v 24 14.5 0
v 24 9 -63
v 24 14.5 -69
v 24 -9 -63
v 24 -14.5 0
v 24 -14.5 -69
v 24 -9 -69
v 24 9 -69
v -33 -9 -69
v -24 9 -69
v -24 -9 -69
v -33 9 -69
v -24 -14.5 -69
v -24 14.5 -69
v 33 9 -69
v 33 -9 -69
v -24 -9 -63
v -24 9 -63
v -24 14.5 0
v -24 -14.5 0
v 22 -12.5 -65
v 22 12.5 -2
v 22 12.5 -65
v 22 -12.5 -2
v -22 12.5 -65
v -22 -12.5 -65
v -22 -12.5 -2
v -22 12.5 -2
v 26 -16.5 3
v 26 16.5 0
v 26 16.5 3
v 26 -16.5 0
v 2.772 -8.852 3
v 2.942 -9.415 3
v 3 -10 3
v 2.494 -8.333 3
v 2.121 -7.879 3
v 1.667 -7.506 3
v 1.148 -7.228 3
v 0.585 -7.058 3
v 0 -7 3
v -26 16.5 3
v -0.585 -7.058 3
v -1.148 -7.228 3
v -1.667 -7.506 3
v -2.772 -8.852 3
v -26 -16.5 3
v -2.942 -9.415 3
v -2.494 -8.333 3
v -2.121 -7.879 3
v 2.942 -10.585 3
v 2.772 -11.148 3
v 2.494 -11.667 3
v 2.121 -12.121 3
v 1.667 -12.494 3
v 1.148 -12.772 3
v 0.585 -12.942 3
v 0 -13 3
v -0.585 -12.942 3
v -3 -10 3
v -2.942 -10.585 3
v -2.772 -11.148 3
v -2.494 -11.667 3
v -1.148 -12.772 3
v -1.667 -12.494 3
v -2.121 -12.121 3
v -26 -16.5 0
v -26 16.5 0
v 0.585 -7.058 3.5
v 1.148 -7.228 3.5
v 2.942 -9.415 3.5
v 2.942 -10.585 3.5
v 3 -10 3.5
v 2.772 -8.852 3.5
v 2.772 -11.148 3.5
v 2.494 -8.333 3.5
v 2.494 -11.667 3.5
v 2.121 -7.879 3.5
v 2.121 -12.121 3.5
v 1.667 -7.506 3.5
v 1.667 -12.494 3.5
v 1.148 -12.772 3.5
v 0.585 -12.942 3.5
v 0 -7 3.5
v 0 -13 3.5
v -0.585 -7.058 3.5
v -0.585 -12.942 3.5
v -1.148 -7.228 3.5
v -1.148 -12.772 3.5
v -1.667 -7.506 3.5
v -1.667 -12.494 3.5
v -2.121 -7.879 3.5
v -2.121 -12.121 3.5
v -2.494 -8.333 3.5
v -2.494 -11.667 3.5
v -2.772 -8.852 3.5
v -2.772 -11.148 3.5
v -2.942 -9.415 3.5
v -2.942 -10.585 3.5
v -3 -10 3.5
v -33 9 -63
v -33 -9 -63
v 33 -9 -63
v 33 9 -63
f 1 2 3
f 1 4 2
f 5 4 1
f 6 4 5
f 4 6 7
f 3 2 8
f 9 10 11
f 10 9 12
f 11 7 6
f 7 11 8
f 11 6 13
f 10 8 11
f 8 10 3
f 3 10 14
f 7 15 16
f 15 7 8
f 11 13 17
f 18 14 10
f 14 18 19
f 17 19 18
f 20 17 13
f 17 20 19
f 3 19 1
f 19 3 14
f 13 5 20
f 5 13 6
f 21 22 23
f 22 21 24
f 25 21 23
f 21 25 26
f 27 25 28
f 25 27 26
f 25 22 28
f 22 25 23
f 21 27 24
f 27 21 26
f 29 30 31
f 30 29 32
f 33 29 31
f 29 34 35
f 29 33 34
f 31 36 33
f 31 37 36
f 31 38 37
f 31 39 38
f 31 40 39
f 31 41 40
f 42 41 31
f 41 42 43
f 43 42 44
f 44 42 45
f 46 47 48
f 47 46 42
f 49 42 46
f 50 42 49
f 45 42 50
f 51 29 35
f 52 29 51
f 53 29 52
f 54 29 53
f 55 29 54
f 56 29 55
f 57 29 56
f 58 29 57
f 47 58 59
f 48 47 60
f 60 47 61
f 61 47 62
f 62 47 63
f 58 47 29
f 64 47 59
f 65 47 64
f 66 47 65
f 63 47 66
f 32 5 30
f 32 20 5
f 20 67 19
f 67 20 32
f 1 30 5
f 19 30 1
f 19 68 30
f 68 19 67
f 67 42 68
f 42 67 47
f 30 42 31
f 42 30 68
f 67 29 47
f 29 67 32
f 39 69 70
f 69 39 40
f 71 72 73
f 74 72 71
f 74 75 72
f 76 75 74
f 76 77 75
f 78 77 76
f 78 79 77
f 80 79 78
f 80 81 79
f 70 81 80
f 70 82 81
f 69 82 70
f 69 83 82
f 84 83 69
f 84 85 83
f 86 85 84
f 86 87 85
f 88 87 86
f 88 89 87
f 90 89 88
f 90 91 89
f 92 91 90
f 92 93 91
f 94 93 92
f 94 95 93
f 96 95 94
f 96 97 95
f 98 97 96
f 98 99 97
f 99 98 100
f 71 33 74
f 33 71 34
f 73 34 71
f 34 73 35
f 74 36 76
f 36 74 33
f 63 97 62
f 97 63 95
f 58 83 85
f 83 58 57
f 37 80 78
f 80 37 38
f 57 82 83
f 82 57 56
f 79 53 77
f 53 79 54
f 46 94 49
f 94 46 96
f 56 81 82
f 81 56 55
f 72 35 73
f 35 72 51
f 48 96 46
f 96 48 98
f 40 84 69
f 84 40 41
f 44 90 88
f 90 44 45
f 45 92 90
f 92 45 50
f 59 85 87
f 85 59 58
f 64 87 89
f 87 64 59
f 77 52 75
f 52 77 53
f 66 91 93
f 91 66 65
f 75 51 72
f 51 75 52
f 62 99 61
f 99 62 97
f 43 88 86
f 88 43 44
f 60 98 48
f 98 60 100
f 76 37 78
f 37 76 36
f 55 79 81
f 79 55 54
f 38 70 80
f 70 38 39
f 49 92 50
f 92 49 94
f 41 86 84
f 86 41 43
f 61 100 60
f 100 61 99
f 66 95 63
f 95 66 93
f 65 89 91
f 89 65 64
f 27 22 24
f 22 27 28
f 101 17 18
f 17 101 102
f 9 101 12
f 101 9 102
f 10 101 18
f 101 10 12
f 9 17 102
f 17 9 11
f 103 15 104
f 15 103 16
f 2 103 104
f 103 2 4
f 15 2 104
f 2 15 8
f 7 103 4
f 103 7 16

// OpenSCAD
// Parameters
overall_width_mm = 48; //[24:96:1]
overall_height_mm = 29; //[15:58:1]
overall_depth_mm = 70; //[35:140:1]
bezel_width_mm = 52; //[26:104:1]
bezel_height_mm = 33; //[17:66:1]
bezel_thickness_mm = 3; //[1.5:6:0.5]
corner_radius_mm = 2.5; //[1:5:0.5]
panel_cutout_width_mm = 45; //[22.5:90:1]
panel_cutout_height_mm = 26; //[13:52:1]
panel_thickness_mm = 3; //[1:6:0.5]
mounting_tab_width_mm = 10; //[5:20:1]
mounting_tab_height_mm = 18; //[9:36:1]
mounting_tab_depth_mm = 6; //[3:12:1]
display_window_width_mm = 34; //[17:68:1]
display_window_height_mm = 16; //[8:32:1]
display_window_offset_x_mm = 0; //[-10:10:0.5]
display_window_offset_y_mm = 2; //[-10:10:0.5]
rear_body_wall_thickness_mm = 2; //[1:4:0.5]
rear_clearance_depth_mm = 80; //[40:160:1]
tolerance_mm = 0.2; //[0.05:0.6:0.05]
overlap_mm = 1; //[0.5:2:0.1]
front_detail_depth_mm = 0.8; //[0.3:2:0.1]
button_diameter_mm = 6; //[3:12:0.5]
button_height_mm = 1.5; //[0.8:4:0.1]
button_offset_x_mm = 0; //[-15:15:0.5]
button_offset_y_mm = -10; //[-20:20:0.5]
pcb_thickness_mm = 1.6; //[0.8:3.2:0.1]
pcb_margin_mm = 2; //[1:6:0.5]
connector_width_mm = 20; //[10:40:1]
connector_height_mm = 10; //[5:20:1]
connector_depth_mm = 12; //[6:24:1]

// ---------- Derived Z references (centered coordinate system) ----------
front_face_z = bezel_thickness_mm;                 // front-most face of bezel (bezel centered at z=bezel_thickness/2)
rear_body_center_z = -overall_depth_mm / 2 + overlap_mm;

// Panel Meter - complete geometry (single connected solid)
module panel_meter_solid() {
  union() {
    // Front Bezel (solid)
    translate([0, 0, bezel_thickness_mm / 2])
      cube([bezel_width_mm, bezel_height_mm, bezel_thickness_mm], center=true);

    // Rear Body (hollow shell) - overlaps into bezel by overlap_mm to guarantee connection
    translate([0, 0, rear_body_center_z])
      difference() {
        cube([overall_width_mm, overall_height_mm, overall_depth_mm], center=true);
        translate([0, 0, rear_body_wall_thickness_mm])
          cube([overall_width_mm - 2 * rear_body_wall_thickness_mm,
                overall_height_mm - 2 * rear_body_wall_thickness_mm,
                overall_depth_mm - 2 * rear_body_wall_thickness_mm], center=true);
      }

    // Front Face Detailing (raised) - attached to bezel
    translate([display_window_offset_x_mm, display_window_offset_y_mm,
               front_face_z - front_detail_depth_mm / 2])
      cube([display_window_width_mm + 6 * tolerance_mm,
            display_window_height_mm + 6 * tolerance_mm,
            front_detail_depth_mm], center=true);

    // Button (silver disc) - FIXED: physically intersects bezel by overlap_mm (no floating)
    // Place button so its back face is inside the bezel by overlap_mm:
    // button_center_z = front_face_z + button_height/2 - overlap
    translate([button_offset_x_mm, button_offset_y_mm,
               front_face_z + button_height_mm / 2 - overlap_mm])
      cylinder(r=button_diameter_mm / 2, h=button_height_mm, center=true, $fn=32);
  }
}

// Panel Meter Cutout - kept as separate reference geometry (not part of the meter solid)
module panel_meter_cutout() {
  color("DimGray") {
    // Panel Cutout Profile
    translate([0, 0, -panel_thickness_mm / 2 + overlap_mm])
      cube([panel_cutout_width_mm + 2 * tolerance_mm,
            panel_cutout_height_mm + 2 * tolerance_mm,
            panel_thickness_mm], center=true);

    // Mounting Tabs
    translate([-overall_width_mm / 2 - mounting_tab_width_mm / 2 + overlap_mm, 0,
               -overall_depth_mm + mounting_tab_depth_mm / 2 + overlap_mm])
      cube([mounting_tab_width_mm, mounting_tab_height_mm, mounting_tab_depth_mm], center=true);

    translate([overall_width_mm / 2 + mounting_tab_width_mm / 2 - overlap_mm, 0,
               -overall_depth_mm + mounting_tab_depth_mm / 2 + overlap_mm])
      cube([mounting_tab_width_mm, mounting_tab_height_mm, mounting_tab_depth_mm], center=true);
  }
}

// Assembly
module assembly() {
  // Single connected solid for the meter (all parts unioned)
  color("Black") panel_meter_solid();

  // Optional reference cutout (not unioned with meter)
  panel_meter_cutout();
}

assembly();
